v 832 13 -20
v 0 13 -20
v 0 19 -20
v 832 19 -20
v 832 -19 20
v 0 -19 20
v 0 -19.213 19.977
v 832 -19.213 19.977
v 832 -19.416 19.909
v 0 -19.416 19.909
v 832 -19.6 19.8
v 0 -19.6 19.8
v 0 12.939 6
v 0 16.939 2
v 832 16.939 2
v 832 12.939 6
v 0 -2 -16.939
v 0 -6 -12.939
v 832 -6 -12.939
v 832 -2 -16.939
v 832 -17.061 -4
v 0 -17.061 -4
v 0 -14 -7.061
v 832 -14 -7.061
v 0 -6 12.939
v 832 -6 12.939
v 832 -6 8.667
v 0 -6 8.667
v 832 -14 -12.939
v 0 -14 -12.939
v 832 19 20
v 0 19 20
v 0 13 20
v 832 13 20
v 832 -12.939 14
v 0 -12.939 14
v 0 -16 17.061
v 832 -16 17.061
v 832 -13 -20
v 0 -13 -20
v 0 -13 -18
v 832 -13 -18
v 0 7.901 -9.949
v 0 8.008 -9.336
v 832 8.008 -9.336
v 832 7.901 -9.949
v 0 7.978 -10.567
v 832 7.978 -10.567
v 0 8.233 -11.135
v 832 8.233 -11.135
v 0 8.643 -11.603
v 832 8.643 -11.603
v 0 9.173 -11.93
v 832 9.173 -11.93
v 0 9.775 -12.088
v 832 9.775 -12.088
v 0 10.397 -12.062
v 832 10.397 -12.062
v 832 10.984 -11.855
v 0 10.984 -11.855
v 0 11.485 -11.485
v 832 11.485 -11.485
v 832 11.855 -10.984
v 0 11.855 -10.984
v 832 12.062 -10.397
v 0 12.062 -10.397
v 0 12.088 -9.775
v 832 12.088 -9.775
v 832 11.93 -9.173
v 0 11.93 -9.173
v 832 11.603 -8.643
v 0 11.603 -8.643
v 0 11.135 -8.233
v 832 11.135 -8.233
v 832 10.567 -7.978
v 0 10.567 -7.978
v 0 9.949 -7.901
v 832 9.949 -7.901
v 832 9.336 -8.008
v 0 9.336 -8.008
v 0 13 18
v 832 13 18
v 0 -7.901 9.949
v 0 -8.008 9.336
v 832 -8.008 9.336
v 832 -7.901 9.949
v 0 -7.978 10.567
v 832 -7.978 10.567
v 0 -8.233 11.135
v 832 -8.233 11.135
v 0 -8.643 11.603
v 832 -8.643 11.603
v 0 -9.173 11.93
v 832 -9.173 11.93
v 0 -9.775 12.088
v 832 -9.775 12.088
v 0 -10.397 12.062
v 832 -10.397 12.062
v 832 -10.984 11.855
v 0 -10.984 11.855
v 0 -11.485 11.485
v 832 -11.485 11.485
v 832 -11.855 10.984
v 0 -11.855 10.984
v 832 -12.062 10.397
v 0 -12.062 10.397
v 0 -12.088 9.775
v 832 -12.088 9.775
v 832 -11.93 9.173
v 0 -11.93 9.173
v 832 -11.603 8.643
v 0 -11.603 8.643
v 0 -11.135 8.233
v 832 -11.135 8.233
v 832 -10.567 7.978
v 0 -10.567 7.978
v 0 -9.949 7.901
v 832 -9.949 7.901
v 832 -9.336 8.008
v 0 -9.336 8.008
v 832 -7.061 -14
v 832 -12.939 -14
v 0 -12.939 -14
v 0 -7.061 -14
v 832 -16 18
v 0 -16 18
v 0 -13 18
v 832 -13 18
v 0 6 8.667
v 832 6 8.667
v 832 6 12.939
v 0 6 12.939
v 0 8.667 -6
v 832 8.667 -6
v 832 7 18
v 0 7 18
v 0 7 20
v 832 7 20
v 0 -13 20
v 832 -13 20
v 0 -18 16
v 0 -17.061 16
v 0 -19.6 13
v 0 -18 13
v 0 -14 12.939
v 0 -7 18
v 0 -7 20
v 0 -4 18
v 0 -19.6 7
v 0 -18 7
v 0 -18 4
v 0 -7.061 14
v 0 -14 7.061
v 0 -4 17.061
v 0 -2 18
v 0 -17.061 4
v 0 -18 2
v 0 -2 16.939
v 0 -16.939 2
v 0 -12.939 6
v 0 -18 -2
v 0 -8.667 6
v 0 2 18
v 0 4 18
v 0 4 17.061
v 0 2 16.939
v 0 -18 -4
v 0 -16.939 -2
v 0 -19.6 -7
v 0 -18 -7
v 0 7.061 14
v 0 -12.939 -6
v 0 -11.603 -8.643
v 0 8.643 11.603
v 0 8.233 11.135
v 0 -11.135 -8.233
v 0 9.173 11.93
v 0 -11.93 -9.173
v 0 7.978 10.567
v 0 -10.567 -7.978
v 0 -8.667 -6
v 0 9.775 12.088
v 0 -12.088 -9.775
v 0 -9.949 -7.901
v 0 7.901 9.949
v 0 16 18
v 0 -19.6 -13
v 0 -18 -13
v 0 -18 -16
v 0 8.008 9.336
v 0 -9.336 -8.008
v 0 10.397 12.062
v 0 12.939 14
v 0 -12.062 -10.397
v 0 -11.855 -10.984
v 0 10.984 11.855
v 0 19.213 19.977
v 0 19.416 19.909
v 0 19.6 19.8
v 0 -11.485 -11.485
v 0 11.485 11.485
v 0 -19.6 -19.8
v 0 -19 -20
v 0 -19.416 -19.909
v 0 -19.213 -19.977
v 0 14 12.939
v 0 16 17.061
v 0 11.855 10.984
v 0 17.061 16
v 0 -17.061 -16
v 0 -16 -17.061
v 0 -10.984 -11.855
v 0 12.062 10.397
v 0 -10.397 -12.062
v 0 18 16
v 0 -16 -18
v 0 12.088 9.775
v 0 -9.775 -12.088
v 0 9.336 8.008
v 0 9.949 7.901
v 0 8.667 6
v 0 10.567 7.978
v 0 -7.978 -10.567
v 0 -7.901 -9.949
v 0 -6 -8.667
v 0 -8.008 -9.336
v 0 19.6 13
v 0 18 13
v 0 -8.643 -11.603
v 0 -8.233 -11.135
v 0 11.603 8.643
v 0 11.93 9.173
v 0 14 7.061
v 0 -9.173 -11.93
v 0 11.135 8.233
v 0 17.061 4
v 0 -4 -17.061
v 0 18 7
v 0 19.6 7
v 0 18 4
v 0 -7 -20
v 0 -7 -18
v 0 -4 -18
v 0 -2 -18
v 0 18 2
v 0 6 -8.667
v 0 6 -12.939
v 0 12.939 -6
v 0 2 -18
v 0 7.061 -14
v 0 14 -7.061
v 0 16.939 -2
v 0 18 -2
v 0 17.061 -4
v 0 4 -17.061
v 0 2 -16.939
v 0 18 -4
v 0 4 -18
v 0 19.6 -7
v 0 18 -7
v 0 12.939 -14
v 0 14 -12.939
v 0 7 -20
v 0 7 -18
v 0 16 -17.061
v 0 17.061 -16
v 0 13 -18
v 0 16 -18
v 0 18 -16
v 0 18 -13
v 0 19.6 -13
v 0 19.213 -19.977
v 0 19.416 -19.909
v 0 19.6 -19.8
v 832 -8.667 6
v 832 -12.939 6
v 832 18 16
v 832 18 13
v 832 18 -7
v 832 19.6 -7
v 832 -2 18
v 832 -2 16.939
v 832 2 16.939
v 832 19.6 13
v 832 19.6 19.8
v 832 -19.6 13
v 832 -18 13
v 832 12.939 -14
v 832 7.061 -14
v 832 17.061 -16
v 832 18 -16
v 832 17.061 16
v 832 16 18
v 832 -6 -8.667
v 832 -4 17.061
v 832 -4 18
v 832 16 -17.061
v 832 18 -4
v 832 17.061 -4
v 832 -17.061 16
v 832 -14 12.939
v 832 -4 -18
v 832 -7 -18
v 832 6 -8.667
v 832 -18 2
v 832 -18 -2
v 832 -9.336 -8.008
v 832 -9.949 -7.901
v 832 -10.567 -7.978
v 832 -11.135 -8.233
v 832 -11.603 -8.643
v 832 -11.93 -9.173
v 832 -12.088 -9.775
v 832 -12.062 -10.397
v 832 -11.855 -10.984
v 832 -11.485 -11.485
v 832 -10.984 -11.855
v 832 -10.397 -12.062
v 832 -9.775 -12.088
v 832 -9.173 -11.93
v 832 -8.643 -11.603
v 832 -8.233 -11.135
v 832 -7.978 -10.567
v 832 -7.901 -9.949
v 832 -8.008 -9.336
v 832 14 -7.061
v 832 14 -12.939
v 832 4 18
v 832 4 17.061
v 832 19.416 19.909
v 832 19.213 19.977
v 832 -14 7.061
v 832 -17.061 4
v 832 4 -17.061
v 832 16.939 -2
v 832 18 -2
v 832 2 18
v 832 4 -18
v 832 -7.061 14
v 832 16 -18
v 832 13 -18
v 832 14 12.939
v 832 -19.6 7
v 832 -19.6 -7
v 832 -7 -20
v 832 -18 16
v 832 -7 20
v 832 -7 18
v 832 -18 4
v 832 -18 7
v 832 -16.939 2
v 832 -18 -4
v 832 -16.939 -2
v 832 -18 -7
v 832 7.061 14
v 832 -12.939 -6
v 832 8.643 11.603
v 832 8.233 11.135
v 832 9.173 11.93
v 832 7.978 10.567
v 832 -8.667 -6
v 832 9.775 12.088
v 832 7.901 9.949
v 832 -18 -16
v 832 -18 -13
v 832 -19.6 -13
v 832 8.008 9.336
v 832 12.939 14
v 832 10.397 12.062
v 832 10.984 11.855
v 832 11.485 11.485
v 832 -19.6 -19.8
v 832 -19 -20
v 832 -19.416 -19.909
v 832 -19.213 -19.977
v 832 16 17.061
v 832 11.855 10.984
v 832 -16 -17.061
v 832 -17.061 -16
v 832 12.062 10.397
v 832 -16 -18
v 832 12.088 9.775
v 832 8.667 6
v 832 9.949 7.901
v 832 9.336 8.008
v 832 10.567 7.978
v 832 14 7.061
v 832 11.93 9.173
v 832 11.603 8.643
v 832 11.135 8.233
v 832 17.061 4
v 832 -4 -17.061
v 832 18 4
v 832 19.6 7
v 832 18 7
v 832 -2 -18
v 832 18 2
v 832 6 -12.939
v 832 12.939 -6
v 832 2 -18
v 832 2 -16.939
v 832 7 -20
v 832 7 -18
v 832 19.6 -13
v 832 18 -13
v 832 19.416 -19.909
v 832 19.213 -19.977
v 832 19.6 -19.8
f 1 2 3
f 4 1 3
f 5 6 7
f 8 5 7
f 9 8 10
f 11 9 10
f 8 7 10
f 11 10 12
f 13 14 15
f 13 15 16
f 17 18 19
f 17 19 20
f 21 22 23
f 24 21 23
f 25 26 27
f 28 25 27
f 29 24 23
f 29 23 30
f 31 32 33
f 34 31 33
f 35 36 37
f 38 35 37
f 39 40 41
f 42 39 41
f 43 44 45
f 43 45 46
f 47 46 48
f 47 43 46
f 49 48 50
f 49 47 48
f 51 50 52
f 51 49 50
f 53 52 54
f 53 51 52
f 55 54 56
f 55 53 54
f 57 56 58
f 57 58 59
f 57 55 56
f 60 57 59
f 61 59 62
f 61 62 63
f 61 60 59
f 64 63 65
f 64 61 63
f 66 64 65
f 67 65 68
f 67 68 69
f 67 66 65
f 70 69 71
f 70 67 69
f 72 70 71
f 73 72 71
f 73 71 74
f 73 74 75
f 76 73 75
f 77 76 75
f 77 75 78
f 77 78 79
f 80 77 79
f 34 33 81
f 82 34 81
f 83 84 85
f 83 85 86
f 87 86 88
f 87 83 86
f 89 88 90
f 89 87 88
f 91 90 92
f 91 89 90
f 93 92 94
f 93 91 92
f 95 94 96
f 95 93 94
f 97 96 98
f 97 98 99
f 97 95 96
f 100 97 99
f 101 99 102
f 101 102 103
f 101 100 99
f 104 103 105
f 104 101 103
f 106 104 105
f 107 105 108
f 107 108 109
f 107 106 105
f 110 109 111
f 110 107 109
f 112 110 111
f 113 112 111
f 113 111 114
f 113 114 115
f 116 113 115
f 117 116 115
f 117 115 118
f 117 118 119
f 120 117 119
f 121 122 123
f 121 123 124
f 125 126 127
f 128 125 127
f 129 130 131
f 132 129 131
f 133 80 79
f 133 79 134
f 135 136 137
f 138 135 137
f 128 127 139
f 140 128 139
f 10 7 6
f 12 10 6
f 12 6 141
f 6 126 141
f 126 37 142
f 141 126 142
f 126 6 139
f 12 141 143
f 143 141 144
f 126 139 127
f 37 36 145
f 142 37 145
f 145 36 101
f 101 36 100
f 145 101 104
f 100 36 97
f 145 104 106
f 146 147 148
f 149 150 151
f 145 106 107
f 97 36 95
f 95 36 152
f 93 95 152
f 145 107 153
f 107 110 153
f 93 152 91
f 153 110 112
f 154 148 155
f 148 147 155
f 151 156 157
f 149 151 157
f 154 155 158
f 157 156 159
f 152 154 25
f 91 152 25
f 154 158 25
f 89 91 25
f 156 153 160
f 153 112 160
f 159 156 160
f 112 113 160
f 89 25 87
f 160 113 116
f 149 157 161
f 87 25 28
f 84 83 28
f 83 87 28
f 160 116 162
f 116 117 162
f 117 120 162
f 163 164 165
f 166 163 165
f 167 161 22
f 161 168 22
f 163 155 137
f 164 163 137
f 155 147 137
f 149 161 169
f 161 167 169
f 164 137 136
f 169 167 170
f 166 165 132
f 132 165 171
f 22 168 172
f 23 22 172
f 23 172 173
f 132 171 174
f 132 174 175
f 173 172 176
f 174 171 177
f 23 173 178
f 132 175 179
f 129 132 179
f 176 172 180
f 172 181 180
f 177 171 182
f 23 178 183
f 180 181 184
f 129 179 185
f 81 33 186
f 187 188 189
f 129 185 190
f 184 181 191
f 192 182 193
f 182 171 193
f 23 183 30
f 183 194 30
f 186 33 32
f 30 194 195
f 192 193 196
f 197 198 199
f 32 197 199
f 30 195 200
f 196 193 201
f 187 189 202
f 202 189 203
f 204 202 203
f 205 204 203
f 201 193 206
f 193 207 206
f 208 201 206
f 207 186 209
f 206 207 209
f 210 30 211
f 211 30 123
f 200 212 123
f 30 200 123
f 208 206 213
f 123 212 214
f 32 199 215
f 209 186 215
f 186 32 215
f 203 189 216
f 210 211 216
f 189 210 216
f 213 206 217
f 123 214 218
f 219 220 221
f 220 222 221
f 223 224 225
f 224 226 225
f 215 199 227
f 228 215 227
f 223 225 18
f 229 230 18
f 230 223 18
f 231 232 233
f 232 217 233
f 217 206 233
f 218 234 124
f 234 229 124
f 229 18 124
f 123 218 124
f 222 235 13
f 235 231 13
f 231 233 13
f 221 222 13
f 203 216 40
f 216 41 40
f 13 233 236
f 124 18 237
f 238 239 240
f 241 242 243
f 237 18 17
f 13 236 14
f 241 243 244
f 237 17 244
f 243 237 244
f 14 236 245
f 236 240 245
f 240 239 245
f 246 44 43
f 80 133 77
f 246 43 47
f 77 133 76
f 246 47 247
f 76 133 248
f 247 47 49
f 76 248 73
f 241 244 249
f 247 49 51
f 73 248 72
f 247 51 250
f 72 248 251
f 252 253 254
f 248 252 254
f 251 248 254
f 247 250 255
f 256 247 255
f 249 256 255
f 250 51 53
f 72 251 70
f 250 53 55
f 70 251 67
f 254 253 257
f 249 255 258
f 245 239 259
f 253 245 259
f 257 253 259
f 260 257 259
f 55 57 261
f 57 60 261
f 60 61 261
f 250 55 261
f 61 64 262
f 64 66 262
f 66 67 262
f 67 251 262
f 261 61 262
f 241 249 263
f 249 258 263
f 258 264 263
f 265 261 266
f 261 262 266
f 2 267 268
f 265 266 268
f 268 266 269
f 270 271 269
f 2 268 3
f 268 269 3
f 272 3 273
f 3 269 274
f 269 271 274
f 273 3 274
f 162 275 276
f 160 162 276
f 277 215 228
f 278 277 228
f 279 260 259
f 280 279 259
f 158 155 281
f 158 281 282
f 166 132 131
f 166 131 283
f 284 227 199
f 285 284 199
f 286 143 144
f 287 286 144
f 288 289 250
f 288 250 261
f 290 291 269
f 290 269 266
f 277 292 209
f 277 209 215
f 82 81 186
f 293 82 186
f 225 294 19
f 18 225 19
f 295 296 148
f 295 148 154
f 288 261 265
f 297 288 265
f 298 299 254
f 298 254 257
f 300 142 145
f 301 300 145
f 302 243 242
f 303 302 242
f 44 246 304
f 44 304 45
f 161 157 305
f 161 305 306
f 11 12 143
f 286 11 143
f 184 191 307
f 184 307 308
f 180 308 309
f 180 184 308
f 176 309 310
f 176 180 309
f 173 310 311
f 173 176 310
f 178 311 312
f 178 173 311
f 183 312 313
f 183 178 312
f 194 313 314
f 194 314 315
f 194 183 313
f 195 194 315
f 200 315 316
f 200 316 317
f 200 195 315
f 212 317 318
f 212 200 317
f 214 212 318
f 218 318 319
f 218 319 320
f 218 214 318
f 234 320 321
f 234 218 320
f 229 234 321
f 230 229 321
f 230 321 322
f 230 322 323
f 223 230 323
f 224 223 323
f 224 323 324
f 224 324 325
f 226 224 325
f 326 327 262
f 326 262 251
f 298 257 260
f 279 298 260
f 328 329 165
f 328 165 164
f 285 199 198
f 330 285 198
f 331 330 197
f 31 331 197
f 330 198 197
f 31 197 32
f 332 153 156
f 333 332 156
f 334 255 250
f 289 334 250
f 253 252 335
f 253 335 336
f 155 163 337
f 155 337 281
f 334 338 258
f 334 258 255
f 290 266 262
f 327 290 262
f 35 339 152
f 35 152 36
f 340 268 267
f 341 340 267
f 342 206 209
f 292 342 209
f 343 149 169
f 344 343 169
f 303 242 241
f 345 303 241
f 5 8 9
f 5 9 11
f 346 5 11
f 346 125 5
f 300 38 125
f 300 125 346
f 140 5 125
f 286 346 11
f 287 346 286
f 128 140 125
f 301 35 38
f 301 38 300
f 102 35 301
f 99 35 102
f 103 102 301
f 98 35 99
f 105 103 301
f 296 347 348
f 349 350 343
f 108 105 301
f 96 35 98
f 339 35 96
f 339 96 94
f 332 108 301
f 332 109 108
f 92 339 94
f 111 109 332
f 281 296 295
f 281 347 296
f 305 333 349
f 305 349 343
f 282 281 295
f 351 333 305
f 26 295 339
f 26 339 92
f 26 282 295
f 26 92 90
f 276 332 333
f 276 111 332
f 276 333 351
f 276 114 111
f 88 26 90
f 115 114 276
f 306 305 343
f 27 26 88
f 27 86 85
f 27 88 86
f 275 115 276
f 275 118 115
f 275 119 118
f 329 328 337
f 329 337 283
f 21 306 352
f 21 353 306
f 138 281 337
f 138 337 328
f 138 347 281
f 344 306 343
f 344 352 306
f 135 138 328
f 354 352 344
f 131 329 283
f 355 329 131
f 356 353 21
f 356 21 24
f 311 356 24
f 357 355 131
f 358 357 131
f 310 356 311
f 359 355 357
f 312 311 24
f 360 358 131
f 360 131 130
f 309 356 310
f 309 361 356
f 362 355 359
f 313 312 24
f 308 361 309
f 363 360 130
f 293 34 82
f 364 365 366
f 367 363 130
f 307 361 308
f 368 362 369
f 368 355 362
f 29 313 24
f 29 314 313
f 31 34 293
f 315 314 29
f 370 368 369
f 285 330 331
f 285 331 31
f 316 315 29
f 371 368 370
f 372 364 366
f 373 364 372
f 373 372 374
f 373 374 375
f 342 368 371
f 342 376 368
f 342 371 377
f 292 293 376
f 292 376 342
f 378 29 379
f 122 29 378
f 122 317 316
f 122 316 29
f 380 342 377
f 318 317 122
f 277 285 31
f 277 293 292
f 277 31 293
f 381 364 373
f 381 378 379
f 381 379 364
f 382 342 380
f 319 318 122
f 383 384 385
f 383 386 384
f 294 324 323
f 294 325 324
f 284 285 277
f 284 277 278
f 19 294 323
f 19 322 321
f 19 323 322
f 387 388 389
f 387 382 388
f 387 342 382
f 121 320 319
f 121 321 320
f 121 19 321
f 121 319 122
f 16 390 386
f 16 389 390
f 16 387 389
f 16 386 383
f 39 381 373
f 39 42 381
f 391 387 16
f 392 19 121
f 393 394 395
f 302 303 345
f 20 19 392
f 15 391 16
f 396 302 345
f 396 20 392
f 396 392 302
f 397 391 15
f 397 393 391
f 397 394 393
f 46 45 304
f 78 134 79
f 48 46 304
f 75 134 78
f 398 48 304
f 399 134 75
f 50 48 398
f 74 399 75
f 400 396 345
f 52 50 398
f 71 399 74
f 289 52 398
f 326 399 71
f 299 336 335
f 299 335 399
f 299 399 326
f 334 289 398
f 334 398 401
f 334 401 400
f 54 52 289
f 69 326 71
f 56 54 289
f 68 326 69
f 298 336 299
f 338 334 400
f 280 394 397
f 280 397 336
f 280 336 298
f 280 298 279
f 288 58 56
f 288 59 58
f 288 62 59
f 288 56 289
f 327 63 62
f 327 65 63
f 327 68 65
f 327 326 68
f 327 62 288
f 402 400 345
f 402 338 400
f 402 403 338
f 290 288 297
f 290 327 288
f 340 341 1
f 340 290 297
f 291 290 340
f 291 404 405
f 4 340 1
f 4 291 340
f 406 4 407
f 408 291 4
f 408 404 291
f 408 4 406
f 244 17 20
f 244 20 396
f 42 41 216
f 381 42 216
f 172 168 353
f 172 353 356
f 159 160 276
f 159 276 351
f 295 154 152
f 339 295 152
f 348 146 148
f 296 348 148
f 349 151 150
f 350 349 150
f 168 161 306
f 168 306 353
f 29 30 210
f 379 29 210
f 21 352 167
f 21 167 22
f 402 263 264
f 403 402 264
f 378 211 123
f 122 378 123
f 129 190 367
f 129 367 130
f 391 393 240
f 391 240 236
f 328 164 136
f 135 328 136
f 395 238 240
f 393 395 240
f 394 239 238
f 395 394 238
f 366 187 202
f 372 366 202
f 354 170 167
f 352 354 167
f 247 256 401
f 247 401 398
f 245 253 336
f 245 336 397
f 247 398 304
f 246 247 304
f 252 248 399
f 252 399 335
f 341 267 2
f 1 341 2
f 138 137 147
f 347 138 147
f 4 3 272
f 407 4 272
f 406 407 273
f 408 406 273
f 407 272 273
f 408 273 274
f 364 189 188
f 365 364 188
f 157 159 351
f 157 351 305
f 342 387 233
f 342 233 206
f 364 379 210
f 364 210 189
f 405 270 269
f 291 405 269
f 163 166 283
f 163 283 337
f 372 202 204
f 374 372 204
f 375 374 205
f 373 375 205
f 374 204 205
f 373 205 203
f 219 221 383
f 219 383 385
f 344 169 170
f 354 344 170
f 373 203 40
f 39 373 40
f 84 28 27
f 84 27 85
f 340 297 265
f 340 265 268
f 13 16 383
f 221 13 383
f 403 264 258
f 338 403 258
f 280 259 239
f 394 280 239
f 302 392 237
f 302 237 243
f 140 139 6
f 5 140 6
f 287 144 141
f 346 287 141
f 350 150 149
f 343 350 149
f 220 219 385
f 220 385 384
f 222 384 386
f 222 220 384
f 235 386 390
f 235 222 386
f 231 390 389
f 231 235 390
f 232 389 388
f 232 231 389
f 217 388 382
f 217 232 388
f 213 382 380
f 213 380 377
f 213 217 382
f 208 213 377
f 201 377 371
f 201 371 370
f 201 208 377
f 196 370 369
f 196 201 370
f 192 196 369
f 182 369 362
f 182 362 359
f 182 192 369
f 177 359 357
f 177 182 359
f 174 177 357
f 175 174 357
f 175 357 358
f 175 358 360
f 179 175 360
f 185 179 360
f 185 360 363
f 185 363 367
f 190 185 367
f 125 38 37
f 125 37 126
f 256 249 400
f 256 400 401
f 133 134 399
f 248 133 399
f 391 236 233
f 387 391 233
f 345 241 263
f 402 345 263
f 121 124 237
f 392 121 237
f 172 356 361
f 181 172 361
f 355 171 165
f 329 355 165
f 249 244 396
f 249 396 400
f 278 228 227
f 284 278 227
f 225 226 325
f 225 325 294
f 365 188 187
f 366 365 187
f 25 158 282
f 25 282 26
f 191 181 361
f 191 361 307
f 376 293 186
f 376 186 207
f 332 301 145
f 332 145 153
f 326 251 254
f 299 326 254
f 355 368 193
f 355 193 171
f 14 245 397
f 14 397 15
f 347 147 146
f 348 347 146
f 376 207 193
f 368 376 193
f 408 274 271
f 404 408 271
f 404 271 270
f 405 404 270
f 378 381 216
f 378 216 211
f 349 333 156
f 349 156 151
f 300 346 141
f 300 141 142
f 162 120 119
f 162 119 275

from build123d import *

# Parameters (mm, degrees)
BOSS_EXTRUDE1_DEPTH = 832


with BuildPart() as part:
    # Sketch1 → Boss-Extrude1 (new body)
    with BuildSketch(Plane(origin=(0, 0, 0), x_dir=(0, 0, -1), z_dir=(1, 0, 0))):
        with BuildLine():
            Line((-20, 19), (-20, 13))
            Line((-20, 13), (-18, 13))
            Line((-18, 13), (-18, 16))
            Line((-18, 16), (-17.060660172, 16))
            Line((-17.060660172, 16), (-14, 12.939339828))
            Line((-14, 12.939339828), (-14, 7.060660172))
            Line((-14, 7.060660172), (-17.060660172, 4))
            Line((-17.060660172, 4), (-18, 4))
            Line((-18, 4), (-18, 7))
            Line((-18, 7), (-20, 7))
            Line((-20, 7), (-20, -7))
            Line((-20, -7), (-18, -7))
            Line((-18, -7), (-18, -4))
            Line((-18, -4), (-17.060660172, -4))
            Line((-17.060660172, -4), (-14, -7.060660172))
            Line((-14, -7.060660172), (-14, -12.939339828))
            Line((-14, -12.939339828), (-17.060660172, -16))
            Line((-17.060660172, -16), (-18, -16))
            Line((-18, -16), (-18, -13))
            Line((-18, -13), (-20, -13))
            Line((-20, -13), (-20, -19))
            ThreePointArc((-20, -19), (-19.948683298, -19.316227766), (-19.8, -19.6))
            Line((-19.8, -19.6), (-13, -19.6))
            Line((-13, -19.6), (-13, -18))
            Line((-13, -18), (-16, -18))
            Line((-16, -18), (-16, -17.060660172))
            Line((-16, -17.060660172), (-12.939339828, -14))
            Line((-12.939339828, -14), (-7.060660172, -14))
            Line((-7.060660172, -14), (-4, -17.060660172))
            Line((-4, -17.060660172), (-4, -18))
            Line((-4, -18), (-7, -18))
            Line((-7, -18), (-7, -19.6))
            Line((-7, -19.6), (7, -19.6))
            Line((7, -19.6), (7, -18))
            Line((7, -18), (4, -18))
            Line((4, -18), (4, -17.060660172))
            Line((4, -17.060660172), (7.060660172, -14))
            Line((7.060660172, -14), (12.939339828, -14))
            Line((12.939339828, -14), (16, -17.060660172))
            Line((16, -17.060660172), (16, -18))
            Line((16, -18), (13, -18))
            Line((13, -18), (13, -19.6))
            Line((13, -19.6), (19.8, -19.6))
            ThreePointArc((19.8, -19.6), (19.948683298, -19.316227766), (20, -19))
            Line((20, -19), (20, -13))
            Line((20, -13), (18, -13))
            Line((18, -13), (18, -16))
            Line((18, -16), (17.060660172, -16))
            Line((17.060660172, -16), (14, -12.939339828))
            Line((14, -12.939339828), (14, -7.060660172))
            Line((14, -7.060660172), (17.060660172, -4))
            Line((17.060660172, -4), (18, -4))
            Line((18, -4), (18, -7))
            Line((18, -7), (20, -7))
            Line((20, -7), (20, 7))
            Line((20, 7), (18, 7))
            Line((18, 7), (18, 4))
            Line((18, 4), (17.060660172, 4))
            Line((17.060660172, 4), (14, 7.060660172))
            Line((14, 7.060660172), (14, 12.939339828))
            Line((14, 12.939339828), (17.060660172, 16))
            Line((17.060660172, 16), (18, 16))
            Line((18, 16), (18, 13))
            Line((18, 13), (20, 13))
            Line((20, 13), (20, 19))
            ThreePointArc((20, 19), (19.948683298, 19.316227766), (19.8, 19.6))
            Line((19.8, 19.6), (13, 19.6))
            Line((13, 19.6), (13, 18))
            Line((13, 18), (16, 18))
            Line((16, 18), (16, 17.060660172))
            Line((16, 17.060660172), (12.939339828, 14))
            Line((12.939339828, 14), (7.060660172, 14))
            Line((7.060660172, 14), (4, 17.060660172))
            Line((4, 17.060660172), (4, 18))
            Line((4, 18), (7, 18))
            Line((7, 18), (7, 19.6))
            Line((7, 19.6), (-7, 19.6))
            Line((-7, 19.6), (-7, 18))
            Line((-7, 18), (-4, 18))
            Line((-4, 18), (-4, 17.060660172))
            Line((-4, 17.060660172), (-7.060660172, 14))
            Line((-7.060660172, 14), (-12.939339828, 14))
            Line((-12.939339828, 14), (-16, 17.060660172))
            Line((-16, 17.060660172), (-16, 18))
            Line((-16, 18), (-13, 18))
            Line((-13, 18), (-13, 19.6))
            Line((-13, 19.6), (-19.8, 19.6))
            ThreePointArc((-19.8, 19.6), (-19.948683298, 19.316227766), (-20, 19))
        make_face()
        with BuildLine():
            Line((-16.939339828, 2), (-18, 2))
            Line((-18, 2), (-18, -2))
            Line((-18, -2), (-16.939339828, -2))
            Line((-16.939339828, -2), (-12.939339828, -6))
            Line((-12.939339828, -6), (-8.666662697, -6))
            Line((-8.666662697, -6), (-9.335919912, -8.007765667))
            ThreePointArc((-9.335919912, -8.007765667), (-11.48492424, -11.48492424), (-8.007765667, -9.335919912))
            Line((-8.007765667, -9.335919912), (-6, -8.666662697))
            Line((-6, -8.666662697), (-6, -12.939339828))
            Line((-6, -12.939339828), (-2, -16.939339828))
            Line((-2, -16.939339828), (-2, -18))
            Line((-2, -18), (2, -18))
            Line((2, -18), (2, -16.939339828))
            Line((2, -16.939339828), (6, -12.939339828))
            Line((6, -12.939339828), (6, -8.666662697))
            Line((6, -8.666662697), (8.007765667, -9.335919912))
            ThreePointArc((8.007765667, -9.335919912), (11.48492424, -11.48492424), (9.335919912, -8.007765667))
            Line((9.335919912, -8.007765667), (8.666662697, -6))
            Line((8.666662697, -6), (12.939339828, -6))
            Line((12.939339828, -6), (16.939339828, -2))
            Line((16.939339828, -2), (18, -2))
            Line((18, -2), (18, 2))
            Line((18, 2), (16.939339828, 2))
            Line((16.939339828, 2), (12.939339828, 6))
            Line((12.939339828, 6), (8.666662697, 6))
            Line((8.666662697, 6), (9.335919912, 8.007765667))
            ThreePointArc((9.335919912, 8.007765667), (11.48492424, 11.48492424), (8.007765667, 9.335919912))
            Line((8.007765667, 9.335919912), (6, 8.666662697))
            Line((6, 8.666662697), (6, 12.939339828))
            Line((6, 12.939339828), (2, 16.939339828))
            Line((2, 16.939339828), (2, 18))
            Line((2, 18), (-2, 18))
            Line((-2, 18), (-2, 16.939339828))
            Line((-2, 16.939339828), (-6, 12.939339828))
            Line((-6, 12.939339828), (-6, 8.666662697))
            Line((-6, 8.666662697), (-8.007765667, 9.335919912))
            ThreePointArc((-8.007765667, 9.335919912), (-11.48492424, 11.48492424), (-9.335919912, 8.007765667))
            Line((-9.335919912, 8.007765667), (-8.666662697, 6))
            Line((-8.666662697, 6), (-12.939339828, 6))
            Line((-12.939339828, 6), (-16.939339828, 2))
        make_face(mode=Mode.SUBTRACT)
    extrude(amount=BOSS_EXTRUDE1_DEPTH)


solid = part.part
